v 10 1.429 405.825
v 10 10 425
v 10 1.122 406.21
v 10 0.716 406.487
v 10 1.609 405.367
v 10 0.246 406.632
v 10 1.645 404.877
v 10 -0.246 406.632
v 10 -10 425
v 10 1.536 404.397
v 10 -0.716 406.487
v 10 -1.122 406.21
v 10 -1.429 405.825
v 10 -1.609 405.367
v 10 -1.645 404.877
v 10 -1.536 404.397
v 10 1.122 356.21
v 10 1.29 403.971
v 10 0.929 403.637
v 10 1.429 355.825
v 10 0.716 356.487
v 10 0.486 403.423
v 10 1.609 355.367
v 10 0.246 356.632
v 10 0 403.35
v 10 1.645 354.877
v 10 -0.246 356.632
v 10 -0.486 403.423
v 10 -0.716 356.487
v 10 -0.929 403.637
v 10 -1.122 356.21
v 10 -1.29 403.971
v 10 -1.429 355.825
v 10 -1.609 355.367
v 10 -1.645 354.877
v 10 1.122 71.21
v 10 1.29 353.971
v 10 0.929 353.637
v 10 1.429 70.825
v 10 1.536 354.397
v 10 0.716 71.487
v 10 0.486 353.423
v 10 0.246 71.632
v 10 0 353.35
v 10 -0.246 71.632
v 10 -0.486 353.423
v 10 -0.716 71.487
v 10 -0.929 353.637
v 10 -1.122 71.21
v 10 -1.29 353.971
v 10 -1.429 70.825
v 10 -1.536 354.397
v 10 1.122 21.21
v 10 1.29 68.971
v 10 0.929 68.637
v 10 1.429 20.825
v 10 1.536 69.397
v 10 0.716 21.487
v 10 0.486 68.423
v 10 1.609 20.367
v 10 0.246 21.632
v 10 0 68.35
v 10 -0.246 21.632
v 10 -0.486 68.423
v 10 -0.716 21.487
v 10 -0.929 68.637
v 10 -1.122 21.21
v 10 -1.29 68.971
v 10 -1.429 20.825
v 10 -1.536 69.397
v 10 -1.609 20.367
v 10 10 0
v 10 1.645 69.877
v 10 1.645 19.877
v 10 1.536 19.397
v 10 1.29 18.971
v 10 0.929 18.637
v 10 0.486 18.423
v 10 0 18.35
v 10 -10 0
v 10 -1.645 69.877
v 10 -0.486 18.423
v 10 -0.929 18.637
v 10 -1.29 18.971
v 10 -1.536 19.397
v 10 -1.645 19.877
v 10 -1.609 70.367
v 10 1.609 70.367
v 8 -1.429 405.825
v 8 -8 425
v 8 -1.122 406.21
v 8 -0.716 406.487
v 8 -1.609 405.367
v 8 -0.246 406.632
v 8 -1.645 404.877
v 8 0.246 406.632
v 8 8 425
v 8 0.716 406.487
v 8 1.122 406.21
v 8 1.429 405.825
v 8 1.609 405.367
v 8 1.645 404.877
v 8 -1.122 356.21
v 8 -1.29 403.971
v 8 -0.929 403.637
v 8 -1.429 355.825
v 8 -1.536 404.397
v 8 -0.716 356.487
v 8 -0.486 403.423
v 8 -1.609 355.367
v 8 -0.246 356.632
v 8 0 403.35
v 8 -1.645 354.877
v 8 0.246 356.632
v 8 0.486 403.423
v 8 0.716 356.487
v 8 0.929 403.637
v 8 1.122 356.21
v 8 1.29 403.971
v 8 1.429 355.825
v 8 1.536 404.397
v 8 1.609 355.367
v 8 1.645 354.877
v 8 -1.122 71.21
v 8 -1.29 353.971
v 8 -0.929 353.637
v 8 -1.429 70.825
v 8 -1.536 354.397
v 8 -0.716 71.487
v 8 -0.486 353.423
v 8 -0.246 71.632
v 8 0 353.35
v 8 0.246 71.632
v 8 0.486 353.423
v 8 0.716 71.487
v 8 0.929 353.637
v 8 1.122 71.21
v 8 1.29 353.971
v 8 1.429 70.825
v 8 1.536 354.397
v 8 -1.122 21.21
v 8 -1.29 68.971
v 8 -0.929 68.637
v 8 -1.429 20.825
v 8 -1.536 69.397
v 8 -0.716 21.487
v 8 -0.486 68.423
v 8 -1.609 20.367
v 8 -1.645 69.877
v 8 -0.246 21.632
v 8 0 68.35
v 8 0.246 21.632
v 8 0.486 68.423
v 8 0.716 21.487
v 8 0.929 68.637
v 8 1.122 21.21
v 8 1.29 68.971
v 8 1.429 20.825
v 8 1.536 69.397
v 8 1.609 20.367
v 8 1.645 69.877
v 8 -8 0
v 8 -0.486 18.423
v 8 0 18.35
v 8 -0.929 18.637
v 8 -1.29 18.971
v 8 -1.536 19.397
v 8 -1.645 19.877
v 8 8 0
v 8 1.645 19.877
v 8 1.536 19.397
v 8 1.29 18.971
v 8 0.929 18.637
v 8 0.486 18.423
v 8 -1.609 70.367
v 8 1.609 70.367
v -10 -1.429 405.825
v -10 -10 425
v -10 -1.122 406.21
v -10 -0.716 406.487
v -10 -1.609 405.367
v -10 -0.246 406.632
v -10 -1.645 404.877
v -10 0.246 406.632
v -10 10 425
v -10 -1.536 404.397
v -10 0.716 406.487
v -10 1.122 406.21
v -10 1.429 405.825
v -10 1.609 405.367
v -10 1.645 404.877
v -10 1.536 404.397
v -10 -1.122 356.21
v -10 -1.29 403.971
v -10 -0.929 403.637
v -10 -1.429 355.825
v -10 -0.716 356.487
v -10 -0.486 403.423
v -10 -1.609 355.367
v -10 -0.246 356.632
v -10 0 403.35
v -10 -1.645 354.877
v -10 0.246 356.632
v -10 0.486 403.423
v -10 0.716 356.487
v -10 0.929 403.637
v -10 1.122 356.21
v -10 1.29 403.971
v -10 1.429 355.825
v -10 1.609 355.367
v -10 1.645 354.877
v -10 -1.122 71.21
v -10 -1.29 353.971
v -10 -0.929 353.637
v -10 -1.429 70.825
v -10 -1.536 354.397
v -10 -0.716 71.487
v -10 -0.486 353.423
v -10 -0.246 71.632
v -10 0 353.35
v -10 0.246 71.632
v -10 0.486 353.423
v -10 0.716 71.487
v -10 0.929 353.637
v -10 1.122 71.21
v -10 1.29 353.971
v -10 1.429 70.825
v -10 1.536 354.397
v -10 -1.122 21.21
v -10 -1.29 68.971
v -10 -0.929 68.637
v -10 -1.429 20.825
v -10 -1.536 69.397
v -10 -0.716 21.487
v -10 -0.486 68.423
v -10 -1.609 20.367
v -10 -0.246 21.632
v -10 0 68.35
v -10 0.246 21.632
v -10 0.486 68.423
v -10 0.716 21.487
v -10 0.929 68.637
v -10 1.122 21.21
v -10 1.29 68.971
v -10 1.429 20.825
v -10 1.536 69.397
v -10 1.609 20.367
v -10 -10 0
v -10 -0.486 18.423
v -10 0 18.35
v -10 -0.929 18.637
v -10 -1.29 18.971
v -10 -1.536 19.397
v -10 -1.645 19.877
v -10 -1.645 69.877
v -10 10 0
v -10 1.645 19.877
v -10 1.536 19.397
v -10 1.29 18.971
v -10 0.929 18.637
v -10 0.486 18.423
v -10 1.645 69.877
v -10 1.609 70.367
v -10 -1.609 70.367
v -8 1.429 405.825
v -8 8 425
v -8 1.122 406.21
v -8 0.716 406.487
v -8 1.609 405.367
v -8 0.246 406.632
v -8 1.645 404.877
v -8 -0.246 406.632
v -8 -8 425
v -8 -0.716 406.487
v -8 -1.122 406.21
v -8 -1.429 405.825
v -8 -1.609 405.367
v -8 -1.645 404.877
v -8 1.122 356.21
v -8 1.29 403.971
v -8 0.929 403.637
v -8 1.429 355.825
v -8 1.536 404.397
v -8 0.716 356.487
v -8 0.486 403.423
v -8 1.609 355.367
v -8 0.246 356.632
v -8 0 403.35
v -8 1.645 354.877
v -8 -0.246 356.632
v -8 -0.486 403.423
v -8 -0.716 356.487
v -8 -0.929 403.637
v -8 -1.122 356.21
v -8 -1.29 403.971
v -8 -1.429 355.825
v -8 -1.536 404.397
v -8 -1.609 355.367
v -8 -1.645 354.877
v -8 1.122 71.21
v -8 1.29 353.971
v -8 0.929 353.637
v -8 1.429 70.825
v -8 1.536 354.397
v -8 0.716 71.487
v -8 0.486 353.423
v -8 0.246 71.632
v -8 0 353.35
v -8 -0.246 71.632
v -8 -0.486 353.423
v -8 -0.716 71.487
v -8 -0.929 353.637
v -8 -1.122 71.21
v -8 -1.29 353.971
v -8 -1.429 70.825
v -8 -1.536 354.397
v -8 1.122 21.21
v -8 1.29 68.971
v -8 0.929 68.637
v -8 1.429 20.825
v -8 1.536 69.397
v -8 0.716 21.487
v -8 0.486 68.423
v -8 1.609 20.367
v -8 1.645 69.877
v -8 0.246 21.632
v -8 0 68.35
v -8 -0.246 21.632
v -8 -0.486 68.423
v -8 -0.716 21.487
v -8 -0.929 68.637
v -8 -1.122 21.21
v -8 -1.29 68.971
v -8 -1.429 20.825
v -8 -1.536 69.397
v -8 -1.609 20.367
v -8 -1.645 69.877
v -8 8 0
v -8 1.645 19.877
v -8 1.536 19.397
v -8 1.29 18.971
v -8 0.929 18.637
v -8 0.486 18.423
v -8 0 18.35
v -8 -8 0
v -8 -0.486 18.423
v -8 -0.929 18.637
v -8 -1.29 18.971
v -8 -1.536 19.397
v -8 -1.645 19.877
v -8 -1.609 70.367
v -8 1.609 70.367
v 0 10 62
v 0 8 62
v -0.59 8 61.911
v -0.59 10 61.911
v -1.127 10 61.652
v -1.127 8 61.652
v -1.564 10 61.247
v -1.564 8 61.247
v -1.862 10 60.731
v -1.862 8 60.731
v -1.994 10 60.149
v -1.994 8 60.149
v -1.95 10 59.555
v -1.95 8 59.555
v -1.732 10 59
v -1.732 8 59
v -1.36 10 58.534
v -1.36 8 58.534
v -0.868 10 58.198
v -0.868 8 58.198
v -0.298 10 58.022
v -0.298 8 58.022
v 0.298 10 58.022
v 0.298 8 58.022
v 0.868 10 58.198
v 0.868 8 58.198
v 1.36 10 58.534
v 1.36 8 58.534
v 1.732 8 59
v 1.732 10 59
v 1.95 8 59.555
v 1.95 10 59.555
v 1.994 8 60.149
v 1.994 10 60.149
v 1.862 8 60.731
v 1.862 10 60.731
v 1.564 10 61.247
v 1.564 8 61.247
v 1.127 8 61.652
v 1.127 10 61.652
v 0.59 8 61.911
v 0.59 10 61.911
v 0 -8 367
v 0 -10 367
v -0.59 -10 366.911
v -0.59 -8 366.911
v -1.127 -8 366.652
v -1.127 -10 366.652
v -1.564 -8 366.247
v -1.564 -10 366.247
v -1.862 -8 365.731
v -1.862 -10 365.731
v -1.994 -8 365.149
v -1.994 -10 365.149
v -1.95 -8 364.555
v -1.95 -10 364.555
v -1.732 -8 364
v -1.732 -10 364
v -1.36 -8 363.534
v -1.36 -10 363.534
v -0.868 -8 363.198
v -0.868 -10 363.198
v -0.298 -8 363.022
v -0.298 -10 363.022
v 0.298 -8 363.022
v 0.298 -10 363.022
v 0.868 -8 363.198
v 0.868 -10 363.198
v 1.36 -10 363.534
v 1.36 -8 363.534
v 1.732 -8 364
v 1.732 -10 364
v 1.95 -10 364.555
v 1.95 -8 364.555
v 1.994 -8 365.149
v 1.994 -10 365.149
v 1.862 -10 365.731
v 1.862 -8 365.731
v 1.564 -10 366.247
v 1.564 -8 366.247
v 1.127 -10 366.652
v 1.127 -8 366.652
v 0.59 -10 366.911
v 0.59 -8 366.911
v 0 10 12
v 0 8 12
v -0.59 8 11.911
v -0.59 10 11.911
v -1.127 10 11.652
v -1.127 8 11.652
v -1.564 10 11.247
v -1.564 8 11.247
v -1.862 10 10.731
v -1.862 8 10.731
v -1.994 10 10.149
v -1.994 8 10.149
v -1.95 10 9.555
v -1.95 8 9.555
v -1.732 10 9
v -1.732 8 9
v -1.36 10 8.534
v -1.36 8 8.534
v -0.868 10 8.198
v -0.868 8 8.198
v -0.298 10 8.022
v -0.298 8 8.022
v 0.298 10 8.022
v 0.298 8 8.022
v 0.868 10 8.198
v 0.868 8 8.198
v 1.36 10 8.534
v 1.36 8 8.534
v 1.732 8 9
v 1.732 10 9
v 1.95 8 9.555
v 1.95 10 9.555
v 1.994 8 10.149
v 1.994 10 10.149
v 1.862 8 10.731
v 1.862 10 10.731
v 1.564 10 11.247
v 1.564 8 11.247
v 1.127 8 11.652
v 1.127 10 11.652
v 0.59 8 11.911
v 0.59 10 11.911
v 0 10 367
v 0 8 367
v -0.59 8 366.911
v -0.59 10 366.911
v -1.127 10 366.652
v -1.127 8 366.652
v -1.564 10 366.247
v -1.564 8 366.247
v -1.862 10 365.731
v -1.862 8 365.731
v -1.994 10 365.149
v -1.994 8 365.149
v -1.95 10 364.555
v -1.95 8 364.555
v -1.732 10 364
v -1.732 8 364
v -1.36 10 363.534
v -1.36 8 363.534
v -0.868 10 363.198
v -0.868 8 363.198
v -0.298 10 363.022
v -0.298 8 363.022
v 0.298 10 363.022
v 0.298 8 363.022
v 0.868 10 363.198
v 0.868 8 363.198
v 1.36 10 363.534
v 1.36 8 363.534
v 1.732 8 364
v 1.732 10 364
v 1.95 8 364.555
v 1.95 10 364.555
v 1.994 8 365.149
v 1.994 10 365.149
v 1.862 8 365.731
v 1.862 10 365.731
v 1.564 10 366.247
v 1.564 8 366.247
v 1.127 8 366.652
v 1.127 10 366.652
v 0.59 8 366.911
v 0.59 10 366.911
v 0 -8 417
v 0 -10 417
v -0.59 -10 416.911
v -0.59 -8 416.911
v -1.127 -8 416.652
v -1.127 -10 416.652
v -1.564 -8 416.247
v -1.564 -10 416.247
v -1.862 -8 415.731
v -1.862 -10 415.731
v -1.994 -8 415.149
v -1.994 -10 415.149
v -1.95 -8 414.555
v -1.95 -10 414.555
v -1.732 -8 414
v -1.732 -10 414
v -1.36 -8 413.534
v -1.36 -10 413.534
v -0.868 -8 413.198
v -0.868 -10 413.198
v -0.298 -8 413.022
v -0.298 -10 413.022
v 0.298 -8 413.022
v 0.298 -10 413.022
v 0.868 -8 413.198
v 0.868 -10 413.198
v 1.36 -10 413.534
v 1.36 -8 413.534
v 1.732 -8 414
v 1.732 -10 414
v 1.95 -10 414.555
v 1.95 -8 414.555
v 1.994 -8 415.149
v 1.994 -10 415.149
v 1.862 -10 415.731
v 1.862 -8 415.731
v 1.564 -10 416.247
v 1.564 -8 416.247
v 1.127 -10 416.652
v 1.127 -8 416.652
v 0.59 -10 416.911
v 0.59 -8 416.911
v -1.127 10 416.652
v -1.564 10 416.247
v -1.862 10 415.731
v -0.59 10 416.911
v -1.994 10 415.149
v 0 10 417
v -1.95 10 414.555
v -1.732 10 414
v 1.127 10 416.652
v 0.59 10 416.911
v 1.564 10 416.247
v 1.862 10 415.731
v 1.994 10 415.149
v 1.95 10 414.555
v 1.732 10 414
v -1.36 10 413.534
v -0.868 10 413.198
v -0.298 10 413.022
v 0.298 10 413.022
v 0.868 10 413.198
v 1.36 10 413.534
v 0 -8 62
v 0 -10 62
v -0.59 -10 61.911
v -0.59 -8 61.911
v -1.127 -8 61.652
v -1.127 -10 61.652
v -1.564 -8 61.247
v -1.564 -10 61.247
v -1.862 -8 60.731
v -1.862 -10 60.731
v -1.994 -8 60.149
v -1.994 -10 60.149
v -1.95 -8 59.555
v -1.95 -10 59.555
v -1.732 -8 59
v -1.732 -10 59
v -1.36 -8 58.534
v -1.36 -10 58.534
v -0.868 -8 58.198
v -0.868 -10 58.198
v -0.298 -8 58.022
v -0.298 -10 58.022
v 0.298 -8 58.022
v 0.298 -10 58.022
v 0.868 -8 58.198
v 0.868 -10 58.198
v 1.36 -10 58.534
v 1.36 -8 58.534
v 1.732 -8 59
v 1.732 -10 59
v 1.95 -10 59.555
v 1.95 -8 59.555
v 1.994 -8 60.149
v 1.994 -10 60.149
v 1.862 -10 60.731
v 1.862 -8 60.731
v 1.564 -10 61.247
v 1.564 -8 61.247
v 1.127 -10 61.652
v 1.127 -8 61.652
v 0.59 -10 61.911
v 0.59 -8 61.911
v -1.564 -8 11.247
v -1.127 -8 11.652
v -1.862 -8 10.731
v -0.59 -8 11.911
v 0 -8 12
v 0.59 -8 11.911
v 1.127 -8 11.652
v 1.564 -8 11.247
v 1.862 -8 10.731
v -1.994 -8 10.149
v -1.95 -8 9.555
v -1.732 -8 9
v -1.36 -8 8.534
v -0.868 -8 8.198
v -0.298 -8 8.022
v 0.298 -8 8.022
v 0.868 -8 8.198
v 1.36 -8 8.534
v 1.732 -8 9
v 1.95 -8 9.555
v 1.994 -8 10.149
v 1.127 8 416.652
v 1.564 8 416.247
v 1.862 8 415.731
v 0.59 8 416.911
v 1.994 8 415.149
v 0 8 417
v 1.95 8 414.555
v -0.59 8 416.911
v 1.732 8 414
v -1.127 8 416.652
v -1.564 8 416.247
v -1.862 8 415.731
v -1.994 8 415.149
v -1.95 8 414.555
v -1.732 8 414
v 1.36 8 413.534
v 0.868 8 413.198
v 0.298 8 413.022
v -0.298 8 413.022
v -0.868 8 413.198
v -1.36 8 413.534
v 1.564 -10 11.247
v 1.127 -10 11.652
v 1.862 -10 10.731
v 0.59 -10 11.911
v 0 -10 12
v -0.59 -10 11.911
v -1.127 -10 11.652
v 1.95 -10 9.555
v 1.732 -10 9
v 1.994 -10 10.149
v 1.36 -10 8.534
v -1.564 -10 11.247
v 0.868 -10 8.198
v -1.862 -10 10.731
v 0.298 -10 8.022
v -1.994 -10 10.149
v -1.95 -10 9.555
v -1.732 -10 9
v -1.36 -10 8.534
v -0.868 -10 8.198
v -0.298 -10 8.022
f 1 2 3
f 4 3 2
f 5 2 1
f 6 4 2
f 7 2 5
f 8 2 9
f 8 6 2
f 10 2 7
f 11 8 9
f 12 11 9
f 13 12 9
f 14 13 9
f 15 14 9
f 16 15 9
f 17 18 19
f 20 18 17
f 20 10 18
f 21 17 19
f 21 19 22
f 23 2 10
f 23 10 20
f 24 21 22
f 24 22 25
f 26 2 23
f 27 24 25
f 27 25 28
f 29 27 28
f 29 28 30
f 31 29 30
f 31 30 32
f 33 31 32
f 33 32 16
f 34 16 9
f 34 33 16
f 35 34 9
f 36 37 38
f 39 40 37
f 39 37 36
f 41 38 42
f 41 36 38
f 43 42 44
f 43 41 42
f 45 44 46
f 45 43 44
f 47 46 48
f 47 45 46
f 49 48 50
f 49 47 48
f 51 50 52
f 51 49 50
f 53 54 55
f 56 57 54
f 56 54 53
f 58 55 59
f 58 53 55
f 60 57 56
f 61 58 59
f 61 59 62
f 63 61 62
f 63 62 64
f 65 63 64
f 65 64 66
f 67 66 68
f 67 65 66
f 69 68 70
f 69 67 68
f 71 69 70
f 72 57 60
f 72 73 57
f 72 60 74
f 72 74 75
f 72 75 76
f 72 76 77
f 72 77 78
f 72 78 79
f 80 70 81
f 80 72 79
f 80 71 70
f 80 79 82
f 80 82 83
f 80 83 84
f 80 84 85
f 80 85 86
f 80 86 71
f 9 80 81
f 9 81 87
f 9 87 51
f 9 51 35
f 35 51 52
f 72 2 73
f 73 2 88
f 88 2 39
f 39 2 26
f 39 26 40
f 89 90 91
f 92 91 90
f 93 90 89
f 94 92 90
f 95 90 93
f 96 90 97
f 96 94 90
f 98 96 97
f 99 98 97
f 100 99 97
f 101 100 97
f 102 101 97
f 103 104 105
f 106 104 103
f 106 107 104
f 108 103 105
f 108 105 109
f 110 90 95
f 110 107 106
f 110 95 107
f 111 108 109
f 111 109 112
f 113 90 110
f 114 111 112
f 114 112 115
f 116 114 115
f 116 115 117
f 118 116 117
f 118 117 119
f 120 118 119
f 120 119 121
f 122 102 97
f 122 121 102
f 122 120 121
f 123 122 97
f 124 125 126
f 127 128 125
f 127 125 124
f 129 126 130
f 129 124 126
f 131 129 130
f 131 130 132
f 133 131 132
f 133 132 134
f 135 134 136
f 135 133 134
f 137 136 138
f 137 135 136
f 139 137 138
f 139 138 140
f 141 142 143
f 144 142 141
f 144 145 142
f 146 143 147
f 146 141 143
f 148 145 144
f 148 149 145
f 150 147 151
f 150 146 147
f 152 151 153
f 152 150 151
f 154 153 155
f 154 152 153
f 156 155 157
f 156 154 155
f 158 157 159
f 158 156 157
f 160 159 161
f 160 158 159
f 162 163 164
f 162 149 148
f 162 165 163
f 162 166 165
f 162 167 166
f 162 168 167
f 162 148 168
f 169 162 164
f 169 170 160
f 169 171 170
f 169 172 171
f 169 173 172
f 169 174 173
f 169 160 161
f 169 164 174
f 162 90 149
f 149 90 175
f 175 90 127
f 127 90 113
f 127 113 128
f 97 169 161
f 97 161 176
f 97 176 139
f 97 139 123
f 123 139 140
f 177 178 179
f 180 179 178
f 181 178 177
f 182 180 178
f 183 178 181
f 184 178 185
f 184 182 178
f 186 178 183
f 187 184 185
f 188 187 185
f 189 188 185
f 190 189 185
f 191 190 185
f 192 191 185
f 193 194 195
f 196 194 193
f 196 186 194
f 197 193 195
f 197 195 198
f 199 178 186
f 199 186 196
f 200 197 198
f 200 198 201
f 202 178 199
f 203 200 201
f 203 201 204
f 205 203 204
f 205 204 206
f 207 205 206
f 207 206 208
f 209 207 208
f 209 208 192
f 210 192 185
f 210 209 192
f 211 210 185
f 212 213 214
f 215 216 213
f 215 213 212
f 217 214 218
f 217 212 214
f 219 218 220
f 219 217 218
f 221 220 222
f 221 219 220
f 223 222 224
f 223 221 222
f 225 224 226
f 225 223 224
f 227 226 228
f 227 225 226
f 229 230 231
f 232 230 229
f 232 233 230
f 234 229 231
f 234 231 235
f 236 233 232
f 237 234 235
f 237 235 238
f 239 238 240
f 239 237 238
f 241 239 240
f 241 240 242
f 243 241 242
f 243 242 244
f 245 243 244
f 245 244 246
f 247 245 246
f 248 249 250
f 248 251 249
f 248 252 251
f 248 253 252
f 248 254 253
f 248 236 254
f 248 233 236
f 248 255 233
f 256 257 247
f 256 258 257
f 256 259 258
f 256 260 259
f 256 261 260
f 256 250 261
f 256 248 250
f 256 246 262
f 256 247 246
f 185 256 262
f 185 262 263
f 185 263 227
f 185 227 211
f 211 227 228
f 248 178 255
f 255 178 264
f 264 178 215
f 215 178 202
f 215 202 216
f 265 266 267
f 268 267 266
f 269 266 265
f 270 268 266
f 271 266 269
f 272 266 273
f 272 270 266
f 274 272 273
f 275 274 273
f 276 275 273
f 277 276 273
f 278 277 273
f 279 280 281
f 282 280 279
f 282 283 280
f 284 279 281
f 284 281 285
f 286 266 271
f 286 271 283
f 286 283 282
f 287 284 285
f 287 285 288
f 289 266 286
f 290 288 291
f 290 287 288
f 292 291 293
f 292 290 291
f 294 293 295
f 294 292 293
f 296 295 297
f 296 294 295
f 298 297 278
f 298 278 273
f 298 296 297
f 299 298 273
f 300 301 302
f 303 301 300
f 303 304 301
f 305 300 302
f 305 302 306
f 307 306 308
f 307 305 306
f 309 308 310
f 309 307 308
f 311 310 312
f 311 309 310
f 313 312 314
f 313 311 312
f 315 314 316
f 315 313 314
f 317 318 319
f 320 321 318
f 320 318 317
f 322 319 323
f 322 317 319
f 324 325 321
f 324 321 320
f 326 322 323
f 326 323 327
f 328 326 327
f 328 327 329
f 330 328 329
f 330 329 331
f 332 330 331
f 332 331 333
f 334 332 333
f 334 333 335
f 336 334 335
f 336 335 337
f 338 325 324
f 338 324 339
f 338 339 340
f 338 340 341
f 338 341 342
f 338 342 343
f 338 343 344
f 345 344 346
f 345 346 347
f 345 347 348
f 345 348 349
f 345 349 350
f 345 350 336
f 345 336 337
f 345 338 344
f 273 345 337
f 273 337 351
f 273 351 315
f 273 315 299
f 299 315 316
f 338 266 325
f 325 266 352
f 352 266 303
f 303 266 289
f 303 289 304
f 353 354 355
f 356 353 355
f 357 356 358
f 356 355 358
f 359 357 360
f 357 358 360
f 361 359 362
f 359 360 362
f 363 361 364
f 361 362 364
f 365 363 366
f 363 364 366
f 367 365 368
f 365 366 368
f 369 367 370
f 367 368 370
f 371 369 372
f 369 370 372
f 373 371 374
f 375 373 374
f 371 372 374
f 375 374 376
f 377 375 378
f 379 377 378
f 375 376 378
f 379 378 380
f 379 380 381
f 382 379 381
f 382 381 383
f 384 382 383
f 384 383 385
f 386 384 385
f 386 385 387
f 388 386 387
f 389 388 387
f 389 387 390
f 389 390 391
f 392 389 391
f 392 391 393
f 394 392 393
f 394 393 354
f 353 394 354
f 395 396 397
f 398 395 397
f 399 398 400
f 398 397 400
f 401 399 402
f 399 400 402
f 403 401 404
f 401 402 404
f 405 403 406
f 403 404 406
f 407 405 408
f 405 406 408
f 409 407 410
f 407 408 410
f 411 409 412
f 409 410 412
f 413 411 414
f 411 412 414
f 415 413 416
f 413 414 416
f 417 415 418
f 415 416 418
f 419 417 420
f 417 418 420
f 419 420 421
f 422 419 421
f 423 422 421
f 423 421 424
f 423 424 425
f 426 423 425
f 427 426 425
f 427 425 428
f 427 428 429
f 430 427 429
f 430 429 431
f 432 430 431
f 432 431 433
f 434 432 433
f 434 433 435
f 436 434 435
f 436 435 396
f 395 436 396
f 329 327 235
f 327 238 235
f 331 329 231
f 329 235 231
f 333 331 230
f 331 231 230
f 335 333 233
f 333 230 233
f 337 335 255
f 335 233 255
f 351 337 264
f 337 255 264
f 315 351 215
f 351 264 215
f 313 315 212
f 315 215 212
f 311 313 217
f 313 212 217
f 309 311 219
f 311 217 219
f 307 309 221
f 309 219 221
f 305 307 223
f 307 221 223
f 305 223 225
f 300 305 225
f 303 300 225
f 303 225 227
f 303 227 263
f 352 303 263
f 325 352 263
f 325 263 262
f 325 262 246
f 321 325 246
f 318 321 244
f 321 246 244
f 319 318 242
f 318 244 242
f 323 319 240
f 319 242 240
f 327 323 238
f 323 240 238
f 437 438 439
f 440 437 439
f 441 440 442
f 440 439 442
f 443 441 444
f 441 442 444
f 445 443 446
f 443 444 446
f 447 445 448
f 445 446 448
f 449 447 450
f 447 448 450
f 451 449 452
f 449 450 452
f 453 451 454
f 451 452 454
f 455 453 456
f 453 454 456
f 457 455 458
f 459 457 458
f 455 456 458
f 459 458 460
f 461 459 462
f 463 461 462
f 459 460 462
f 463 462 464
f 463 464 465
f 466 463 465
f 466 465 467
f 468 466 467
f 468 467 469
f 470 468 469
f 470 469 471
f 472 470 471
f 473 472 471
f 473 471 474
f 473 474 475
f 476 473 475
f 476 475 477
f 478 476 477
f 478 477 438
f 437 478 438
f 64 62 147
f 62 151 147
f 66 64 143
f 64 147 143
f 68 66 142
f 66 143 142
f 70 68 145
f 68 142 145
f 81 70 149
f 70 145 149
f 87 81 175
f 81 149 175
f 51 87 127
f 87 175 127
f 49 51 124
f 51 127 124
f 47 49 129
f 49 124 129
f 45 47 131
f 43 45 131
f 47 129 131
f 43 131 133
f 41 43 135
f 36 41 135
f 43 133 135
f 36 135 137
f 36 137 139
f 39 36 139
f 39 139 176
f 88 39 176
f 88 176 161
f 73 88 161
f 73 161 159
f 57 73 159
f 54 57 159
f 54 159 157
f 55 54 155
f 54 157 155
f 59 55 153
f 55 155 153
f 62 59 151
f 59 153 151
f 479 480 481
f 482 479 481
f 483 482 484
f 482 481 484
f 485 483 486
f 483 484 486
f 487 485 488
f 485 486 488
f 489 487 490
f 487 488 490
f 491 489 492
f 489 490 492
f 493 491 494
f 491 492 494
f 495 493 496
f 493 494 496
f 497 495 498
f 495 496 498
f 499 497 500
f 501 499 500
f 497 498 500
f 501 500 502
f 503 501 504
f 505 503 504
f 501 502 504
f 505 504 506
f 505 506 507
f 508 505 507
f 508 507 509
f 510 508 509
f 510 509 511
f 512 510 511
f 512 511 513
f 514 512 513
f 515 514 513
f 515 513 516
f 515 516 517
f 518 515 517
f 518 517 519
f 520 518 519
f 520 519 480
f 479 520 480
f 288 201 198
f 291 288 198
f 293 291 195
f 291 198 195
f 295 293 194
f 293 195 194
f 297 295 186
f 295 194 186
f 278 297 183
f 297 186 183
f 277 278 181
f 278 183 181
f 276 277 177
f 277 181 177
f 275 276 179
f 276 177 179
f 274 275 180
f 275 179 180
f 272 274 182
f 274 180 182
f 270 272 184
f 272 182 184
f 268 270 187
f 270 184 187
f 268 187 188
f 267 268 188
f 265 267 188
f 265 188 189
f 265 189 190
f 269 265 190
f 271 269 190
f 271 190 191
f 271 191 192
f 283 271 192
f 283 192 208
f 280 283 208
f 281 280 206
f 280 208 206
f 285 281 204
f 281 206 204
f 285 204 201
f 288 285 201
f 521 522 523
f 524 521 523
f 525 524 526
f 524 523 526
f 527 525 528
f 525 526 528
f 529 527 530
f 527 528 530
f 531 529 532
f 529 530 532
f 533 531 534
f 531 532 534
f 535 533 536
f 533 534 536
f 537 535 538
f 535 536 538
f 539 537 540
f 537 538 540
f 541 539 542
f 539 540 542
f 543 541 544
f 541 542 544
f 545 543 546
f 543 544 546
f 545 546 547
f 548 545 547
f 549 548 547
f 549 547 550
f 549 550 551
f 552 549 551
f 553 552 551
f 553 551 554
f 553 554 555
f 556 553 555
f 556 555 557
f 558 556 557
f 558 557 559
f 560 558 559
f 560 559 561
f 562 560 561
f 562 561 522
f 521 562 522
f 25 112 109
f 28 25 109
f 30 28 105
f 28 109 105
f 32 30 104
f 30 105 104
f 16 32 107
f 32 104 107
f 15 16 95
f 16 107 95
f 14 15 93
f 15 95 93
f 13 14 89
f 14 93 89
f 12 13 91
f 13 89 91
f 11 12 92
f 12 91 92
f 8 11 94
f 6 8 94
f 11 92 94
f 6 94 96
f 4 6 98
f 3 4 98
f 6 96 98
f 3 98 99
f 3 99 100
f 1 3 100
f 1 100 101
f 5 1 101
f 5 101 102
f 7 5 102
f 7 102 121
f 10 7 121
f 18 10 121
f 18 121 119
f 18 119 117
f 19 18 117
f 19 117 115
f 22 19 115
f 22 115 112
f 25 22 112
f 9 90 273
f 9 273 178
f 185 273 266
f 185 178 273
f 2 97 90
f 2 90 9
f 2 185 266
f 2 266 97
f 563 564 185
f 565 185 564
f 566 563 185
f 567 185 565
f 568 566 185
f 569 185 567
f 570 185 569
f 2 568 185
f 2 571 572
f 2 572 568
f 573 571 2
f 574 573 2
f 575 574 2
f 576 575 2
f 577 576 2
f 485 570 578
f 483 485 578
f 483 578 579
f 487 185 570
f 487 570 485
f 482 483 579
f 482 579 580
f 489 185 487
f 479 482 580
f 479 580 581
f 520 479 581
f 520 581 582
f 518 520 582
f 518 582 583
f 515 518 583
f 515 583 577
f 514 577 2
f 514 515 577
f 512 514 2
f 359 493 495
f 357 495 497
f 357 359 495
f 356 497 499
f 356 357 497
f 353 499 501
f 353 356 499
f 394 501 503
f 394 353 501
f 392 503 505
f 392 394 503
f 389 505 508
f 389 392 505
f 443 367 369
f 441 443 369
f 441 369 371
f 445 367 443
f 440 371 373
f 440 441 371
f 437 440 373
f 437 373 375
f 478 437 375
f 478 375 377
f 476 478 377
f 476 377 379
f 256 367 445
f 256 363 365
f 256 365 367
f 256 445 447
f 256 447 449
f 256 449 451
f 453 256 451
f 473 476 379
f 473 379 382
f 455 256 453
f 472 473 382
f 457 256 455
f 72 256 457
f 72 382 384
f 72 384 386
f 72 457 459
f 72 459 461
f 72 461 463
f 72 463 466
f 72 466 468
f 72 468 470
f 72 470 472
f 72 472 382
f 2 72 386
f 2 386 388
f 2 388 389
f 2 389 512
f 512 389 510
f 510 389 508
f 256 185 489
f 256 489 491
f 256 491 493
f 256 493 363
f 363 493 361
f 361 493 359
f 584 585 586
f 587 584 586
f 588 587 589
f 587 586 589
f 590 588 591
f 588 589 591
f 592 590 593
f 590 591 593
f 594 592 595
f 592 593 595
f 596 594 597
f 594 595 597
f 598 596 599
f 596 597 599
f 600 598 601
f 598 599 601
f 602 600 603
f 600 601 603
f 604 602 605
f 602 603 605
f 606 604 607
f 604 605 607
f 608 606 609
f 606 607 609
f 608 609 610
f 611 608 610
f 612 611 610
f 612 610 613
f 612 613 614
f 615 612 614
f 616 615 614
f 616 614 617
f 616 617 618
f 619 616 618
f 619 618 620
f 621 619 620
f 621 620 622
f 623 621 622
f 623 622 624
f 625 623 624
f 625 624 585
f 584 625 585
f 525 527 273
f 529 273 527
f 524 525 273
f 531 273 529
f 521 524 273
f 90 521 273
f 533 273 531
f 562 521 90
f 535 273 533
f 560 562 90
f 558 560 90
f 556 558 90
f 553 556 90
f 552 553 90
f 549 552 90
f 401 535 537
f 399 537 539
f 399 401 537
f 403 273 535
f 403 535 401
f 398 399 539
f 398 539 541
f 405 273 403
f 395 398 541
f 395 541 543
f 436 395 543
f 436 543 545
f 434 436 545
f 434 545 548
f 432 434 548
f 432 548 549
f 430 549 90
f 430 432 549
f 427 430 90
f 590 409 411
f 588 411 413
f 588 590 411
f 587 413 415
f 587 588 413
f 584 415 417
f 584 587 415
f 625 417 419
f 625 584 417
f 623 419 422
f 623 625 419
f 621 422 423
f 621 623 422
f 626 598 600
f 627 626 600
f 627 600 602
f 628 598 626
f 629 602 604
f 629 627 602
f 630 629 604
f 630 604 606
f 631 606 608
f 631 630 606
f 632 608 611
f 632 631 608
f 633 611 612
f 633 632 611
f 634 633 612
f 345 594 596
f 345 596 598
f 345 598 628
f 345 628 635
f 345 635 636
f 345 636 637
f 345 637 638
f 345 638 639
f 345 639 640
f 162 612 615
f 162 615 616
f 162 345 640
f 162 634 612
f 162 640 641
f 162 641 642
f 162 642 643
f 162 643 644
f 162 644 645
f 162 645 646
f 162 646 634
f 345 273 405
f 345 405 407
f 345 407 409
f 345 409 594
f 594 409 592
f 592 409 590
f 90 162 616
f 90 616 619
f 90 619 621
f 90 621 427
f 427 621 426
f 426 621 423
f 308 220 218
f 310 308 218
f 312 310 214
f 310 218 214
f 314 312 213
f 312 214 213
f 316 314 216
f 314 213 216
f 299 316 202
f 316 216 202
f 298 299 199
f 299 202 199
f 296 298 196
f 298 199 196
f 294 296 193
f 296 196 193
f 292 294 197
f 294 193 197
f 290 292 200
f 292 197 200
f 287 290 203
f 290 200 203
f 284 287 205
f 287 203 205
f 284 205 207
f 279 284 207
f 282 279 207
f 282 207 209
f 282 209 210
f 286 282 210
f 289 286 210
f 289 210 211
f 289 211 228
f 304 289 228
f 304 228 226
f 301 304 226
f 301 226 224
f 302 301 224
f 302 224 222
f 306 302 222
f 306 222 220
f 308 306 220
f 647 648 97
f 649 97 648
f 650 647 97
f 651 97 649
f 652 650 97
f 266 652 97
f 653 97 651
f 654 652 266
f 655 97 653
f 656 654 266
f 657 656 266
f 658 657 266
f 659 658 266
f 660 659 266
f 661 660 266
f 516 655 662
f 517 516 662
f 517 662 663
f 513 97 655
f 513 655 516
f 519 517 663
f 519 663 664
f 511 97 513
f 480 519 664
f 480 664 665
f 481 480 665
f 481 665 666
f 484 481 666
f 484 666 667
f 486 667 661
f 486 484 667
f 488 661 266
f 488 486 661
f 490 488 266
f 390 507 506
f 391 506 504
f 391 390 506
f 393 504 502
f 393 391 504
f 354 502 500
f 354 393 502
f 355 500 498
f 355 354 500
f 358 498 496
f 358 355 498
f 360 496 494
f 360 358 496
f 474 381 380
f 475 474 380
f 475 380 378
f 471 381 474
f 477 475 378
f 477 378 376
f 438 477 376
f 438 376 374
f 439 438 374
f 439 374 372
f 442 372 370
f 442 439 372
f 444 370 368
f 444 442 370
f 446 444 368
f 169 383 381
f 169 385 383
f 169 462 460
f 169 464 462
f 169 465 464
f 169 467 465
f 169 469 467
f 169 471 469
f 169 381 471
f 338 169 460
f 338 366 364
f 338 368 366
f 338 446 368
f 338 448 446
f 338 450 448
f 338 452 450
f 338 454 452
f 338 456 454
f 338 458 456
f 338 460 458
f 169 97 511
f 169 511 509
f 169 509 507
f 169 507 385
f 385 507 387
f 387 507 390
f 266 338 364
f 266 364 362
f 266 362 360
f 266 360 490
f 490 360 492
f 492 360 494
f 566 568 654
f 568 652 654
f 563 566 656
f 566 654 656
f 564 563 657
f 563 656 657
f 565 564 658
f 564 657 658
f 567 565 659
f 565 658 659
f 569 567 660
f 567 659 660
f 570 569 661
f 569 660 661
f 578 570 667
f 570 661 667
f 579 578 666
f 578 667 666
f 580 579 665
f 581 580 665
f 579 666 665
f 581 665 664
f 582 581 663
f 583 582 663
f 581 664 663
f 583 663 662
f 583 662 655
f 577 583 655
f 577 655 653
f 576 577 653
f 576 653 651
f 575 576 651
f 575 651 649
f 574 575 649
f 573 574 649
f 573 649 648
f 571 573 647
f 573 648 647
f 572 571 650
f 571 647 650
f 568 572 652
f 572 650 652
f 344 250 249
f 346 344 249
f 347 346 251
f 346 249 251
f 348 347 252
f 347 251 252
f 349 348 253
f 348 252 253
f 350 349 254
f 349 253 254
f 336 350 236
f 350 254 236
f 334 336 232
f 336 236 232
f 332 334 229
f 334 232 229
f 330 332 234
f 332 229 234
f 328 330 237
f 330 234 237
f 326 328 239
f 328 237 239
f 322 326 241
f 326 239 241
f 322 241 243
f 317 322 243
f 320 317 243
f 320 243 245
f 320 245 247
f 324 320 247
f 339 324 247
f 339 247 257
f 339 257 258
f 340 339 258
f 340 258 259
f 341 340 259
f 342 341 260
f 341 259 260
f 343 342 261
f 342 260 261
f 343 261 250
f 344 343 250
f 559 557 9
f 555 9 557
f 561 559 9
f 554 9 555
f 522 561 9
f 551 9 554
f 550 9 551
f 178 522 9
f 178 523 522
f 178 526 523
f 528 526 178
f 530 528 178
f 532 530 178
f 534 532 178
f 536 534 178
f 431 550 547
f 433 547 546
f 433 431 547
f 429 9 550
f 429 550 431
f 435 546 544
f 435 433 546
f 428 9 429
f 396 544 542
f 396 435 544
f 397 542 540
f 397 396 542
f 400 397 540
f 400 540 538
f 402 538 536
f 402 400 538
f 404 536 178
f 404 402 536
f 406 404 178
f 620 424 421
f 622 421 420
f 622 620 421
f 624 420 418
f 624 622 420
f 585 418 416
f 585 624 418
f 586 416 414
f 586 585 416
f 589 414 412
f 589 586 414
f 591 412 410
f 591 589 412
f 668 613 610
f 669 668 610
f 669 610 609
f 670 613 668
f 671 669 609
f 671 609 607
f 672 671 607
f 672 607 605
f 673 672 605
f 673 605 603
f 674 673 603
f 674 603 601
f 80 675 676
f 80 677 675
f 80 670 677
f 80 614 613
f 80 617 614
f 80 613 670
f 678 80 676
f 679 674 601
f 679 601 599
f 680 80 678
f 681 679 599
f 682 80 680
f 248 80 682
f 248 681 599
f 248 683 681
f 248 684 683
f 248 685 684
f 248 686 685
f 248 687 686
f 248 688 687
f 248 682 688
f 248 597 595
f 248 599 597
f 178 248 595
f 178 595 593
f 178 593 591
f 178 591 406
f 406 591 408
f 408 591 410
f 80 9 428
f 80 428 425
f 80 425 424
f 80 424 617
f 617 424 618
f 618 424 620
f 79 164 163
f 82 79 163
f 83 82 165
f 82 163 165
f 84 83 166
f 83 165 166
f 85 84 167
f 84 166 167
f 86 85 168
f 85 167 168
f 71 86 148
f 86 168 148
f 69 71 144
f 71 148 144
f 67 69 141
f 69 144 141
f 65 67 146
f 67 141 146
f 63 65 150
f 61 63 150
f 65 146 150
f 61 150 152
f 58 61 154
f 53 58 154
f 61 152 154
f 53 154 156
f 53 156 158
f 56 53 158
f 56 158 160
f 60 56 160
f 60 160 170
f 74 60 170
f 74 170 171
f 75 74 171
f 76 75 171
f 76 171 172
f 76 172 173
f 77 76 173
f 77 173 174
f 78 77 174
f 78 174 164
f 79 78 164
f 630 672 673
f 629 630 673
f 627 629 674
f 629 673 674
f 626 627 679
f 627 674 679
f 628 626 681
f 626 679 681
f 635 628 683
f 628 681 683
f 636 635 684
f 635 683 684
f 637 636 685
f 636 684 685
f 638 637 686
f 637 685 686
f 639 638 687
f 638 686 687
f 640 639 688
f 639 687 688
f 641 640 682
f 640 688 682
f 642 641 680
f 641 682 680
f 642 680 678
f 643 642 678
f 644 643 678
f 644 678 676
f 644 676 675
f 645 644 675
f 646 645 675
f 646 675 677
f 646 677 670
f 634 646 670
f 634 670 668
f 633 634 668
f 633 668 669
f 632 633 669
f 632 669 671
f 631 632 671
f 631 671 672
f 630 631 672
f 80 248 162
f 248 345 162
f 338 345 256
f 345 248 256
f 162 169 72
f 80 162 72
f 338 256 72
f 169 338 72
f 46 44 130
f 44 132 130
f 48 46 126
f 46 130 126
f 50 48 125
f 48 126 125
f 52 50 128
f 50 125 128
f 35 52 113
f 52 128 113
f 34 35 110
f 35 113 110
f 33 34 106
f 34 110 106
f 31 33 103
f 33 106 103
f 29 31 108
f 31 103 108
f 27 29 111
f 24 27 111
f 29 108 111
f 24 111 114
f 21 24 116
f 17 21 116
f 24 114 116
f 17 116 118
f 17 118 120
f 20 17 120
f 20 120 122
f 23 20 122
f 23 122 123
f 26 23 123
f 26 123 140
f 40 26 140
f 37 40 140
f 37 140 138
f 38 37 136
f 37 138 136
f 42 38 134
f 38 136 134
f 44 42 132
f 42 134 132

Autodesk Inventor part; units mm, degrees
ref_plane "YZ Plane" through (0, 0, 0) normal (1, 0, 0) x (0, 1, 0)
ref_plane "XZ Plane" through (0, 0, 0) normal (0, 1, 0) x (-1, 0, 0)
ref_plane "XY Plane" through (0, 0, 0) normal (0, 0, 1) x (1, 0, 0)
sketch "スケッチ1" plane through (0, 0, 0) normal (0, 0, 1) x (1, 0, 0)
  line L0 (10, -10) -> (-10, -10)
  line L1 (-10, -10) -> (-10, 10)
  line L2 (-10, 10) -> (10, 10)
  line L3 (10, 10) -> (10, -10)
  line L4 (10, -10) -> (-10, 10) construction
  line L5 (-10, -10) -> (10, 10) construction
  line L6 (8, 8) -> (-8, 8)
  line L7 (-8, 8) -> (-8, -8)
  line L8 (-8, -8) -> (8, -8)
  line L9 (8, -8) -> (8, 8)
  point P0 (0, 0)
  dimension "d0" = 20
  dimension "d1" = 20
  dimension "d2" = 2
extrude "押し出し1" add sketch "スケッチ1" along normal blind 425
sketch "スケッチ2" plane through (-10, 10, 0) normal (0, 1, 0) x (1, 0, 0)
  line L0 (10, 0) -> (10, -425)
  line L1 (2, -425) -> (18, -425) projected
  line L2 (20, 0) -> (0, 0) projected
  point P0 (10, -415)
  point P1 (10, -365)
  point P2 (10, -60)
  point P3 (10, -10)
  dimension "d5" = 10
  dimension "d6" = 50
  dimension "d7" = 50
  dimension "d9" = 10
hole "穴1" at (0, 10, 415) at (0, 10, 365) at (0, 10, 60) at (0, 10, 10) direction (0, -1, 0) diameter 4 end through all
sketch "スケッチ3" plane through (10, -10, 0) normal (1, 0, 0) x (0, 0, -1)
  line L0 (0, 10) -> (-425, 10)
  line L1 (-425, 20) -> (-425, 0) projected
  line L2 (0, 0) -> (0, 20) projected
  point P0 (-405, 10)
  point P1 (-355, 10)
  point P2 (-20, 10)
  point P3 (-70, 10)
  dimension "d17" = 20
  dimension "d18" = 50
  dimension "d19" = 20
  dimension "d20" = 50
hole "穴2" at (10, 0, 405) at (10, 0, 355) at (10, 0, 20) at (10, 0, 70) direction (-1, 0, 0) diameter 3.3 end through all
equation "\"d7\" = d6"
equation "\"d9\" = d5"
equation "\"d19\" = d17"
equation "\"d20\" = d18"
properties part number "aaa_small_kaku_2020_tka"
